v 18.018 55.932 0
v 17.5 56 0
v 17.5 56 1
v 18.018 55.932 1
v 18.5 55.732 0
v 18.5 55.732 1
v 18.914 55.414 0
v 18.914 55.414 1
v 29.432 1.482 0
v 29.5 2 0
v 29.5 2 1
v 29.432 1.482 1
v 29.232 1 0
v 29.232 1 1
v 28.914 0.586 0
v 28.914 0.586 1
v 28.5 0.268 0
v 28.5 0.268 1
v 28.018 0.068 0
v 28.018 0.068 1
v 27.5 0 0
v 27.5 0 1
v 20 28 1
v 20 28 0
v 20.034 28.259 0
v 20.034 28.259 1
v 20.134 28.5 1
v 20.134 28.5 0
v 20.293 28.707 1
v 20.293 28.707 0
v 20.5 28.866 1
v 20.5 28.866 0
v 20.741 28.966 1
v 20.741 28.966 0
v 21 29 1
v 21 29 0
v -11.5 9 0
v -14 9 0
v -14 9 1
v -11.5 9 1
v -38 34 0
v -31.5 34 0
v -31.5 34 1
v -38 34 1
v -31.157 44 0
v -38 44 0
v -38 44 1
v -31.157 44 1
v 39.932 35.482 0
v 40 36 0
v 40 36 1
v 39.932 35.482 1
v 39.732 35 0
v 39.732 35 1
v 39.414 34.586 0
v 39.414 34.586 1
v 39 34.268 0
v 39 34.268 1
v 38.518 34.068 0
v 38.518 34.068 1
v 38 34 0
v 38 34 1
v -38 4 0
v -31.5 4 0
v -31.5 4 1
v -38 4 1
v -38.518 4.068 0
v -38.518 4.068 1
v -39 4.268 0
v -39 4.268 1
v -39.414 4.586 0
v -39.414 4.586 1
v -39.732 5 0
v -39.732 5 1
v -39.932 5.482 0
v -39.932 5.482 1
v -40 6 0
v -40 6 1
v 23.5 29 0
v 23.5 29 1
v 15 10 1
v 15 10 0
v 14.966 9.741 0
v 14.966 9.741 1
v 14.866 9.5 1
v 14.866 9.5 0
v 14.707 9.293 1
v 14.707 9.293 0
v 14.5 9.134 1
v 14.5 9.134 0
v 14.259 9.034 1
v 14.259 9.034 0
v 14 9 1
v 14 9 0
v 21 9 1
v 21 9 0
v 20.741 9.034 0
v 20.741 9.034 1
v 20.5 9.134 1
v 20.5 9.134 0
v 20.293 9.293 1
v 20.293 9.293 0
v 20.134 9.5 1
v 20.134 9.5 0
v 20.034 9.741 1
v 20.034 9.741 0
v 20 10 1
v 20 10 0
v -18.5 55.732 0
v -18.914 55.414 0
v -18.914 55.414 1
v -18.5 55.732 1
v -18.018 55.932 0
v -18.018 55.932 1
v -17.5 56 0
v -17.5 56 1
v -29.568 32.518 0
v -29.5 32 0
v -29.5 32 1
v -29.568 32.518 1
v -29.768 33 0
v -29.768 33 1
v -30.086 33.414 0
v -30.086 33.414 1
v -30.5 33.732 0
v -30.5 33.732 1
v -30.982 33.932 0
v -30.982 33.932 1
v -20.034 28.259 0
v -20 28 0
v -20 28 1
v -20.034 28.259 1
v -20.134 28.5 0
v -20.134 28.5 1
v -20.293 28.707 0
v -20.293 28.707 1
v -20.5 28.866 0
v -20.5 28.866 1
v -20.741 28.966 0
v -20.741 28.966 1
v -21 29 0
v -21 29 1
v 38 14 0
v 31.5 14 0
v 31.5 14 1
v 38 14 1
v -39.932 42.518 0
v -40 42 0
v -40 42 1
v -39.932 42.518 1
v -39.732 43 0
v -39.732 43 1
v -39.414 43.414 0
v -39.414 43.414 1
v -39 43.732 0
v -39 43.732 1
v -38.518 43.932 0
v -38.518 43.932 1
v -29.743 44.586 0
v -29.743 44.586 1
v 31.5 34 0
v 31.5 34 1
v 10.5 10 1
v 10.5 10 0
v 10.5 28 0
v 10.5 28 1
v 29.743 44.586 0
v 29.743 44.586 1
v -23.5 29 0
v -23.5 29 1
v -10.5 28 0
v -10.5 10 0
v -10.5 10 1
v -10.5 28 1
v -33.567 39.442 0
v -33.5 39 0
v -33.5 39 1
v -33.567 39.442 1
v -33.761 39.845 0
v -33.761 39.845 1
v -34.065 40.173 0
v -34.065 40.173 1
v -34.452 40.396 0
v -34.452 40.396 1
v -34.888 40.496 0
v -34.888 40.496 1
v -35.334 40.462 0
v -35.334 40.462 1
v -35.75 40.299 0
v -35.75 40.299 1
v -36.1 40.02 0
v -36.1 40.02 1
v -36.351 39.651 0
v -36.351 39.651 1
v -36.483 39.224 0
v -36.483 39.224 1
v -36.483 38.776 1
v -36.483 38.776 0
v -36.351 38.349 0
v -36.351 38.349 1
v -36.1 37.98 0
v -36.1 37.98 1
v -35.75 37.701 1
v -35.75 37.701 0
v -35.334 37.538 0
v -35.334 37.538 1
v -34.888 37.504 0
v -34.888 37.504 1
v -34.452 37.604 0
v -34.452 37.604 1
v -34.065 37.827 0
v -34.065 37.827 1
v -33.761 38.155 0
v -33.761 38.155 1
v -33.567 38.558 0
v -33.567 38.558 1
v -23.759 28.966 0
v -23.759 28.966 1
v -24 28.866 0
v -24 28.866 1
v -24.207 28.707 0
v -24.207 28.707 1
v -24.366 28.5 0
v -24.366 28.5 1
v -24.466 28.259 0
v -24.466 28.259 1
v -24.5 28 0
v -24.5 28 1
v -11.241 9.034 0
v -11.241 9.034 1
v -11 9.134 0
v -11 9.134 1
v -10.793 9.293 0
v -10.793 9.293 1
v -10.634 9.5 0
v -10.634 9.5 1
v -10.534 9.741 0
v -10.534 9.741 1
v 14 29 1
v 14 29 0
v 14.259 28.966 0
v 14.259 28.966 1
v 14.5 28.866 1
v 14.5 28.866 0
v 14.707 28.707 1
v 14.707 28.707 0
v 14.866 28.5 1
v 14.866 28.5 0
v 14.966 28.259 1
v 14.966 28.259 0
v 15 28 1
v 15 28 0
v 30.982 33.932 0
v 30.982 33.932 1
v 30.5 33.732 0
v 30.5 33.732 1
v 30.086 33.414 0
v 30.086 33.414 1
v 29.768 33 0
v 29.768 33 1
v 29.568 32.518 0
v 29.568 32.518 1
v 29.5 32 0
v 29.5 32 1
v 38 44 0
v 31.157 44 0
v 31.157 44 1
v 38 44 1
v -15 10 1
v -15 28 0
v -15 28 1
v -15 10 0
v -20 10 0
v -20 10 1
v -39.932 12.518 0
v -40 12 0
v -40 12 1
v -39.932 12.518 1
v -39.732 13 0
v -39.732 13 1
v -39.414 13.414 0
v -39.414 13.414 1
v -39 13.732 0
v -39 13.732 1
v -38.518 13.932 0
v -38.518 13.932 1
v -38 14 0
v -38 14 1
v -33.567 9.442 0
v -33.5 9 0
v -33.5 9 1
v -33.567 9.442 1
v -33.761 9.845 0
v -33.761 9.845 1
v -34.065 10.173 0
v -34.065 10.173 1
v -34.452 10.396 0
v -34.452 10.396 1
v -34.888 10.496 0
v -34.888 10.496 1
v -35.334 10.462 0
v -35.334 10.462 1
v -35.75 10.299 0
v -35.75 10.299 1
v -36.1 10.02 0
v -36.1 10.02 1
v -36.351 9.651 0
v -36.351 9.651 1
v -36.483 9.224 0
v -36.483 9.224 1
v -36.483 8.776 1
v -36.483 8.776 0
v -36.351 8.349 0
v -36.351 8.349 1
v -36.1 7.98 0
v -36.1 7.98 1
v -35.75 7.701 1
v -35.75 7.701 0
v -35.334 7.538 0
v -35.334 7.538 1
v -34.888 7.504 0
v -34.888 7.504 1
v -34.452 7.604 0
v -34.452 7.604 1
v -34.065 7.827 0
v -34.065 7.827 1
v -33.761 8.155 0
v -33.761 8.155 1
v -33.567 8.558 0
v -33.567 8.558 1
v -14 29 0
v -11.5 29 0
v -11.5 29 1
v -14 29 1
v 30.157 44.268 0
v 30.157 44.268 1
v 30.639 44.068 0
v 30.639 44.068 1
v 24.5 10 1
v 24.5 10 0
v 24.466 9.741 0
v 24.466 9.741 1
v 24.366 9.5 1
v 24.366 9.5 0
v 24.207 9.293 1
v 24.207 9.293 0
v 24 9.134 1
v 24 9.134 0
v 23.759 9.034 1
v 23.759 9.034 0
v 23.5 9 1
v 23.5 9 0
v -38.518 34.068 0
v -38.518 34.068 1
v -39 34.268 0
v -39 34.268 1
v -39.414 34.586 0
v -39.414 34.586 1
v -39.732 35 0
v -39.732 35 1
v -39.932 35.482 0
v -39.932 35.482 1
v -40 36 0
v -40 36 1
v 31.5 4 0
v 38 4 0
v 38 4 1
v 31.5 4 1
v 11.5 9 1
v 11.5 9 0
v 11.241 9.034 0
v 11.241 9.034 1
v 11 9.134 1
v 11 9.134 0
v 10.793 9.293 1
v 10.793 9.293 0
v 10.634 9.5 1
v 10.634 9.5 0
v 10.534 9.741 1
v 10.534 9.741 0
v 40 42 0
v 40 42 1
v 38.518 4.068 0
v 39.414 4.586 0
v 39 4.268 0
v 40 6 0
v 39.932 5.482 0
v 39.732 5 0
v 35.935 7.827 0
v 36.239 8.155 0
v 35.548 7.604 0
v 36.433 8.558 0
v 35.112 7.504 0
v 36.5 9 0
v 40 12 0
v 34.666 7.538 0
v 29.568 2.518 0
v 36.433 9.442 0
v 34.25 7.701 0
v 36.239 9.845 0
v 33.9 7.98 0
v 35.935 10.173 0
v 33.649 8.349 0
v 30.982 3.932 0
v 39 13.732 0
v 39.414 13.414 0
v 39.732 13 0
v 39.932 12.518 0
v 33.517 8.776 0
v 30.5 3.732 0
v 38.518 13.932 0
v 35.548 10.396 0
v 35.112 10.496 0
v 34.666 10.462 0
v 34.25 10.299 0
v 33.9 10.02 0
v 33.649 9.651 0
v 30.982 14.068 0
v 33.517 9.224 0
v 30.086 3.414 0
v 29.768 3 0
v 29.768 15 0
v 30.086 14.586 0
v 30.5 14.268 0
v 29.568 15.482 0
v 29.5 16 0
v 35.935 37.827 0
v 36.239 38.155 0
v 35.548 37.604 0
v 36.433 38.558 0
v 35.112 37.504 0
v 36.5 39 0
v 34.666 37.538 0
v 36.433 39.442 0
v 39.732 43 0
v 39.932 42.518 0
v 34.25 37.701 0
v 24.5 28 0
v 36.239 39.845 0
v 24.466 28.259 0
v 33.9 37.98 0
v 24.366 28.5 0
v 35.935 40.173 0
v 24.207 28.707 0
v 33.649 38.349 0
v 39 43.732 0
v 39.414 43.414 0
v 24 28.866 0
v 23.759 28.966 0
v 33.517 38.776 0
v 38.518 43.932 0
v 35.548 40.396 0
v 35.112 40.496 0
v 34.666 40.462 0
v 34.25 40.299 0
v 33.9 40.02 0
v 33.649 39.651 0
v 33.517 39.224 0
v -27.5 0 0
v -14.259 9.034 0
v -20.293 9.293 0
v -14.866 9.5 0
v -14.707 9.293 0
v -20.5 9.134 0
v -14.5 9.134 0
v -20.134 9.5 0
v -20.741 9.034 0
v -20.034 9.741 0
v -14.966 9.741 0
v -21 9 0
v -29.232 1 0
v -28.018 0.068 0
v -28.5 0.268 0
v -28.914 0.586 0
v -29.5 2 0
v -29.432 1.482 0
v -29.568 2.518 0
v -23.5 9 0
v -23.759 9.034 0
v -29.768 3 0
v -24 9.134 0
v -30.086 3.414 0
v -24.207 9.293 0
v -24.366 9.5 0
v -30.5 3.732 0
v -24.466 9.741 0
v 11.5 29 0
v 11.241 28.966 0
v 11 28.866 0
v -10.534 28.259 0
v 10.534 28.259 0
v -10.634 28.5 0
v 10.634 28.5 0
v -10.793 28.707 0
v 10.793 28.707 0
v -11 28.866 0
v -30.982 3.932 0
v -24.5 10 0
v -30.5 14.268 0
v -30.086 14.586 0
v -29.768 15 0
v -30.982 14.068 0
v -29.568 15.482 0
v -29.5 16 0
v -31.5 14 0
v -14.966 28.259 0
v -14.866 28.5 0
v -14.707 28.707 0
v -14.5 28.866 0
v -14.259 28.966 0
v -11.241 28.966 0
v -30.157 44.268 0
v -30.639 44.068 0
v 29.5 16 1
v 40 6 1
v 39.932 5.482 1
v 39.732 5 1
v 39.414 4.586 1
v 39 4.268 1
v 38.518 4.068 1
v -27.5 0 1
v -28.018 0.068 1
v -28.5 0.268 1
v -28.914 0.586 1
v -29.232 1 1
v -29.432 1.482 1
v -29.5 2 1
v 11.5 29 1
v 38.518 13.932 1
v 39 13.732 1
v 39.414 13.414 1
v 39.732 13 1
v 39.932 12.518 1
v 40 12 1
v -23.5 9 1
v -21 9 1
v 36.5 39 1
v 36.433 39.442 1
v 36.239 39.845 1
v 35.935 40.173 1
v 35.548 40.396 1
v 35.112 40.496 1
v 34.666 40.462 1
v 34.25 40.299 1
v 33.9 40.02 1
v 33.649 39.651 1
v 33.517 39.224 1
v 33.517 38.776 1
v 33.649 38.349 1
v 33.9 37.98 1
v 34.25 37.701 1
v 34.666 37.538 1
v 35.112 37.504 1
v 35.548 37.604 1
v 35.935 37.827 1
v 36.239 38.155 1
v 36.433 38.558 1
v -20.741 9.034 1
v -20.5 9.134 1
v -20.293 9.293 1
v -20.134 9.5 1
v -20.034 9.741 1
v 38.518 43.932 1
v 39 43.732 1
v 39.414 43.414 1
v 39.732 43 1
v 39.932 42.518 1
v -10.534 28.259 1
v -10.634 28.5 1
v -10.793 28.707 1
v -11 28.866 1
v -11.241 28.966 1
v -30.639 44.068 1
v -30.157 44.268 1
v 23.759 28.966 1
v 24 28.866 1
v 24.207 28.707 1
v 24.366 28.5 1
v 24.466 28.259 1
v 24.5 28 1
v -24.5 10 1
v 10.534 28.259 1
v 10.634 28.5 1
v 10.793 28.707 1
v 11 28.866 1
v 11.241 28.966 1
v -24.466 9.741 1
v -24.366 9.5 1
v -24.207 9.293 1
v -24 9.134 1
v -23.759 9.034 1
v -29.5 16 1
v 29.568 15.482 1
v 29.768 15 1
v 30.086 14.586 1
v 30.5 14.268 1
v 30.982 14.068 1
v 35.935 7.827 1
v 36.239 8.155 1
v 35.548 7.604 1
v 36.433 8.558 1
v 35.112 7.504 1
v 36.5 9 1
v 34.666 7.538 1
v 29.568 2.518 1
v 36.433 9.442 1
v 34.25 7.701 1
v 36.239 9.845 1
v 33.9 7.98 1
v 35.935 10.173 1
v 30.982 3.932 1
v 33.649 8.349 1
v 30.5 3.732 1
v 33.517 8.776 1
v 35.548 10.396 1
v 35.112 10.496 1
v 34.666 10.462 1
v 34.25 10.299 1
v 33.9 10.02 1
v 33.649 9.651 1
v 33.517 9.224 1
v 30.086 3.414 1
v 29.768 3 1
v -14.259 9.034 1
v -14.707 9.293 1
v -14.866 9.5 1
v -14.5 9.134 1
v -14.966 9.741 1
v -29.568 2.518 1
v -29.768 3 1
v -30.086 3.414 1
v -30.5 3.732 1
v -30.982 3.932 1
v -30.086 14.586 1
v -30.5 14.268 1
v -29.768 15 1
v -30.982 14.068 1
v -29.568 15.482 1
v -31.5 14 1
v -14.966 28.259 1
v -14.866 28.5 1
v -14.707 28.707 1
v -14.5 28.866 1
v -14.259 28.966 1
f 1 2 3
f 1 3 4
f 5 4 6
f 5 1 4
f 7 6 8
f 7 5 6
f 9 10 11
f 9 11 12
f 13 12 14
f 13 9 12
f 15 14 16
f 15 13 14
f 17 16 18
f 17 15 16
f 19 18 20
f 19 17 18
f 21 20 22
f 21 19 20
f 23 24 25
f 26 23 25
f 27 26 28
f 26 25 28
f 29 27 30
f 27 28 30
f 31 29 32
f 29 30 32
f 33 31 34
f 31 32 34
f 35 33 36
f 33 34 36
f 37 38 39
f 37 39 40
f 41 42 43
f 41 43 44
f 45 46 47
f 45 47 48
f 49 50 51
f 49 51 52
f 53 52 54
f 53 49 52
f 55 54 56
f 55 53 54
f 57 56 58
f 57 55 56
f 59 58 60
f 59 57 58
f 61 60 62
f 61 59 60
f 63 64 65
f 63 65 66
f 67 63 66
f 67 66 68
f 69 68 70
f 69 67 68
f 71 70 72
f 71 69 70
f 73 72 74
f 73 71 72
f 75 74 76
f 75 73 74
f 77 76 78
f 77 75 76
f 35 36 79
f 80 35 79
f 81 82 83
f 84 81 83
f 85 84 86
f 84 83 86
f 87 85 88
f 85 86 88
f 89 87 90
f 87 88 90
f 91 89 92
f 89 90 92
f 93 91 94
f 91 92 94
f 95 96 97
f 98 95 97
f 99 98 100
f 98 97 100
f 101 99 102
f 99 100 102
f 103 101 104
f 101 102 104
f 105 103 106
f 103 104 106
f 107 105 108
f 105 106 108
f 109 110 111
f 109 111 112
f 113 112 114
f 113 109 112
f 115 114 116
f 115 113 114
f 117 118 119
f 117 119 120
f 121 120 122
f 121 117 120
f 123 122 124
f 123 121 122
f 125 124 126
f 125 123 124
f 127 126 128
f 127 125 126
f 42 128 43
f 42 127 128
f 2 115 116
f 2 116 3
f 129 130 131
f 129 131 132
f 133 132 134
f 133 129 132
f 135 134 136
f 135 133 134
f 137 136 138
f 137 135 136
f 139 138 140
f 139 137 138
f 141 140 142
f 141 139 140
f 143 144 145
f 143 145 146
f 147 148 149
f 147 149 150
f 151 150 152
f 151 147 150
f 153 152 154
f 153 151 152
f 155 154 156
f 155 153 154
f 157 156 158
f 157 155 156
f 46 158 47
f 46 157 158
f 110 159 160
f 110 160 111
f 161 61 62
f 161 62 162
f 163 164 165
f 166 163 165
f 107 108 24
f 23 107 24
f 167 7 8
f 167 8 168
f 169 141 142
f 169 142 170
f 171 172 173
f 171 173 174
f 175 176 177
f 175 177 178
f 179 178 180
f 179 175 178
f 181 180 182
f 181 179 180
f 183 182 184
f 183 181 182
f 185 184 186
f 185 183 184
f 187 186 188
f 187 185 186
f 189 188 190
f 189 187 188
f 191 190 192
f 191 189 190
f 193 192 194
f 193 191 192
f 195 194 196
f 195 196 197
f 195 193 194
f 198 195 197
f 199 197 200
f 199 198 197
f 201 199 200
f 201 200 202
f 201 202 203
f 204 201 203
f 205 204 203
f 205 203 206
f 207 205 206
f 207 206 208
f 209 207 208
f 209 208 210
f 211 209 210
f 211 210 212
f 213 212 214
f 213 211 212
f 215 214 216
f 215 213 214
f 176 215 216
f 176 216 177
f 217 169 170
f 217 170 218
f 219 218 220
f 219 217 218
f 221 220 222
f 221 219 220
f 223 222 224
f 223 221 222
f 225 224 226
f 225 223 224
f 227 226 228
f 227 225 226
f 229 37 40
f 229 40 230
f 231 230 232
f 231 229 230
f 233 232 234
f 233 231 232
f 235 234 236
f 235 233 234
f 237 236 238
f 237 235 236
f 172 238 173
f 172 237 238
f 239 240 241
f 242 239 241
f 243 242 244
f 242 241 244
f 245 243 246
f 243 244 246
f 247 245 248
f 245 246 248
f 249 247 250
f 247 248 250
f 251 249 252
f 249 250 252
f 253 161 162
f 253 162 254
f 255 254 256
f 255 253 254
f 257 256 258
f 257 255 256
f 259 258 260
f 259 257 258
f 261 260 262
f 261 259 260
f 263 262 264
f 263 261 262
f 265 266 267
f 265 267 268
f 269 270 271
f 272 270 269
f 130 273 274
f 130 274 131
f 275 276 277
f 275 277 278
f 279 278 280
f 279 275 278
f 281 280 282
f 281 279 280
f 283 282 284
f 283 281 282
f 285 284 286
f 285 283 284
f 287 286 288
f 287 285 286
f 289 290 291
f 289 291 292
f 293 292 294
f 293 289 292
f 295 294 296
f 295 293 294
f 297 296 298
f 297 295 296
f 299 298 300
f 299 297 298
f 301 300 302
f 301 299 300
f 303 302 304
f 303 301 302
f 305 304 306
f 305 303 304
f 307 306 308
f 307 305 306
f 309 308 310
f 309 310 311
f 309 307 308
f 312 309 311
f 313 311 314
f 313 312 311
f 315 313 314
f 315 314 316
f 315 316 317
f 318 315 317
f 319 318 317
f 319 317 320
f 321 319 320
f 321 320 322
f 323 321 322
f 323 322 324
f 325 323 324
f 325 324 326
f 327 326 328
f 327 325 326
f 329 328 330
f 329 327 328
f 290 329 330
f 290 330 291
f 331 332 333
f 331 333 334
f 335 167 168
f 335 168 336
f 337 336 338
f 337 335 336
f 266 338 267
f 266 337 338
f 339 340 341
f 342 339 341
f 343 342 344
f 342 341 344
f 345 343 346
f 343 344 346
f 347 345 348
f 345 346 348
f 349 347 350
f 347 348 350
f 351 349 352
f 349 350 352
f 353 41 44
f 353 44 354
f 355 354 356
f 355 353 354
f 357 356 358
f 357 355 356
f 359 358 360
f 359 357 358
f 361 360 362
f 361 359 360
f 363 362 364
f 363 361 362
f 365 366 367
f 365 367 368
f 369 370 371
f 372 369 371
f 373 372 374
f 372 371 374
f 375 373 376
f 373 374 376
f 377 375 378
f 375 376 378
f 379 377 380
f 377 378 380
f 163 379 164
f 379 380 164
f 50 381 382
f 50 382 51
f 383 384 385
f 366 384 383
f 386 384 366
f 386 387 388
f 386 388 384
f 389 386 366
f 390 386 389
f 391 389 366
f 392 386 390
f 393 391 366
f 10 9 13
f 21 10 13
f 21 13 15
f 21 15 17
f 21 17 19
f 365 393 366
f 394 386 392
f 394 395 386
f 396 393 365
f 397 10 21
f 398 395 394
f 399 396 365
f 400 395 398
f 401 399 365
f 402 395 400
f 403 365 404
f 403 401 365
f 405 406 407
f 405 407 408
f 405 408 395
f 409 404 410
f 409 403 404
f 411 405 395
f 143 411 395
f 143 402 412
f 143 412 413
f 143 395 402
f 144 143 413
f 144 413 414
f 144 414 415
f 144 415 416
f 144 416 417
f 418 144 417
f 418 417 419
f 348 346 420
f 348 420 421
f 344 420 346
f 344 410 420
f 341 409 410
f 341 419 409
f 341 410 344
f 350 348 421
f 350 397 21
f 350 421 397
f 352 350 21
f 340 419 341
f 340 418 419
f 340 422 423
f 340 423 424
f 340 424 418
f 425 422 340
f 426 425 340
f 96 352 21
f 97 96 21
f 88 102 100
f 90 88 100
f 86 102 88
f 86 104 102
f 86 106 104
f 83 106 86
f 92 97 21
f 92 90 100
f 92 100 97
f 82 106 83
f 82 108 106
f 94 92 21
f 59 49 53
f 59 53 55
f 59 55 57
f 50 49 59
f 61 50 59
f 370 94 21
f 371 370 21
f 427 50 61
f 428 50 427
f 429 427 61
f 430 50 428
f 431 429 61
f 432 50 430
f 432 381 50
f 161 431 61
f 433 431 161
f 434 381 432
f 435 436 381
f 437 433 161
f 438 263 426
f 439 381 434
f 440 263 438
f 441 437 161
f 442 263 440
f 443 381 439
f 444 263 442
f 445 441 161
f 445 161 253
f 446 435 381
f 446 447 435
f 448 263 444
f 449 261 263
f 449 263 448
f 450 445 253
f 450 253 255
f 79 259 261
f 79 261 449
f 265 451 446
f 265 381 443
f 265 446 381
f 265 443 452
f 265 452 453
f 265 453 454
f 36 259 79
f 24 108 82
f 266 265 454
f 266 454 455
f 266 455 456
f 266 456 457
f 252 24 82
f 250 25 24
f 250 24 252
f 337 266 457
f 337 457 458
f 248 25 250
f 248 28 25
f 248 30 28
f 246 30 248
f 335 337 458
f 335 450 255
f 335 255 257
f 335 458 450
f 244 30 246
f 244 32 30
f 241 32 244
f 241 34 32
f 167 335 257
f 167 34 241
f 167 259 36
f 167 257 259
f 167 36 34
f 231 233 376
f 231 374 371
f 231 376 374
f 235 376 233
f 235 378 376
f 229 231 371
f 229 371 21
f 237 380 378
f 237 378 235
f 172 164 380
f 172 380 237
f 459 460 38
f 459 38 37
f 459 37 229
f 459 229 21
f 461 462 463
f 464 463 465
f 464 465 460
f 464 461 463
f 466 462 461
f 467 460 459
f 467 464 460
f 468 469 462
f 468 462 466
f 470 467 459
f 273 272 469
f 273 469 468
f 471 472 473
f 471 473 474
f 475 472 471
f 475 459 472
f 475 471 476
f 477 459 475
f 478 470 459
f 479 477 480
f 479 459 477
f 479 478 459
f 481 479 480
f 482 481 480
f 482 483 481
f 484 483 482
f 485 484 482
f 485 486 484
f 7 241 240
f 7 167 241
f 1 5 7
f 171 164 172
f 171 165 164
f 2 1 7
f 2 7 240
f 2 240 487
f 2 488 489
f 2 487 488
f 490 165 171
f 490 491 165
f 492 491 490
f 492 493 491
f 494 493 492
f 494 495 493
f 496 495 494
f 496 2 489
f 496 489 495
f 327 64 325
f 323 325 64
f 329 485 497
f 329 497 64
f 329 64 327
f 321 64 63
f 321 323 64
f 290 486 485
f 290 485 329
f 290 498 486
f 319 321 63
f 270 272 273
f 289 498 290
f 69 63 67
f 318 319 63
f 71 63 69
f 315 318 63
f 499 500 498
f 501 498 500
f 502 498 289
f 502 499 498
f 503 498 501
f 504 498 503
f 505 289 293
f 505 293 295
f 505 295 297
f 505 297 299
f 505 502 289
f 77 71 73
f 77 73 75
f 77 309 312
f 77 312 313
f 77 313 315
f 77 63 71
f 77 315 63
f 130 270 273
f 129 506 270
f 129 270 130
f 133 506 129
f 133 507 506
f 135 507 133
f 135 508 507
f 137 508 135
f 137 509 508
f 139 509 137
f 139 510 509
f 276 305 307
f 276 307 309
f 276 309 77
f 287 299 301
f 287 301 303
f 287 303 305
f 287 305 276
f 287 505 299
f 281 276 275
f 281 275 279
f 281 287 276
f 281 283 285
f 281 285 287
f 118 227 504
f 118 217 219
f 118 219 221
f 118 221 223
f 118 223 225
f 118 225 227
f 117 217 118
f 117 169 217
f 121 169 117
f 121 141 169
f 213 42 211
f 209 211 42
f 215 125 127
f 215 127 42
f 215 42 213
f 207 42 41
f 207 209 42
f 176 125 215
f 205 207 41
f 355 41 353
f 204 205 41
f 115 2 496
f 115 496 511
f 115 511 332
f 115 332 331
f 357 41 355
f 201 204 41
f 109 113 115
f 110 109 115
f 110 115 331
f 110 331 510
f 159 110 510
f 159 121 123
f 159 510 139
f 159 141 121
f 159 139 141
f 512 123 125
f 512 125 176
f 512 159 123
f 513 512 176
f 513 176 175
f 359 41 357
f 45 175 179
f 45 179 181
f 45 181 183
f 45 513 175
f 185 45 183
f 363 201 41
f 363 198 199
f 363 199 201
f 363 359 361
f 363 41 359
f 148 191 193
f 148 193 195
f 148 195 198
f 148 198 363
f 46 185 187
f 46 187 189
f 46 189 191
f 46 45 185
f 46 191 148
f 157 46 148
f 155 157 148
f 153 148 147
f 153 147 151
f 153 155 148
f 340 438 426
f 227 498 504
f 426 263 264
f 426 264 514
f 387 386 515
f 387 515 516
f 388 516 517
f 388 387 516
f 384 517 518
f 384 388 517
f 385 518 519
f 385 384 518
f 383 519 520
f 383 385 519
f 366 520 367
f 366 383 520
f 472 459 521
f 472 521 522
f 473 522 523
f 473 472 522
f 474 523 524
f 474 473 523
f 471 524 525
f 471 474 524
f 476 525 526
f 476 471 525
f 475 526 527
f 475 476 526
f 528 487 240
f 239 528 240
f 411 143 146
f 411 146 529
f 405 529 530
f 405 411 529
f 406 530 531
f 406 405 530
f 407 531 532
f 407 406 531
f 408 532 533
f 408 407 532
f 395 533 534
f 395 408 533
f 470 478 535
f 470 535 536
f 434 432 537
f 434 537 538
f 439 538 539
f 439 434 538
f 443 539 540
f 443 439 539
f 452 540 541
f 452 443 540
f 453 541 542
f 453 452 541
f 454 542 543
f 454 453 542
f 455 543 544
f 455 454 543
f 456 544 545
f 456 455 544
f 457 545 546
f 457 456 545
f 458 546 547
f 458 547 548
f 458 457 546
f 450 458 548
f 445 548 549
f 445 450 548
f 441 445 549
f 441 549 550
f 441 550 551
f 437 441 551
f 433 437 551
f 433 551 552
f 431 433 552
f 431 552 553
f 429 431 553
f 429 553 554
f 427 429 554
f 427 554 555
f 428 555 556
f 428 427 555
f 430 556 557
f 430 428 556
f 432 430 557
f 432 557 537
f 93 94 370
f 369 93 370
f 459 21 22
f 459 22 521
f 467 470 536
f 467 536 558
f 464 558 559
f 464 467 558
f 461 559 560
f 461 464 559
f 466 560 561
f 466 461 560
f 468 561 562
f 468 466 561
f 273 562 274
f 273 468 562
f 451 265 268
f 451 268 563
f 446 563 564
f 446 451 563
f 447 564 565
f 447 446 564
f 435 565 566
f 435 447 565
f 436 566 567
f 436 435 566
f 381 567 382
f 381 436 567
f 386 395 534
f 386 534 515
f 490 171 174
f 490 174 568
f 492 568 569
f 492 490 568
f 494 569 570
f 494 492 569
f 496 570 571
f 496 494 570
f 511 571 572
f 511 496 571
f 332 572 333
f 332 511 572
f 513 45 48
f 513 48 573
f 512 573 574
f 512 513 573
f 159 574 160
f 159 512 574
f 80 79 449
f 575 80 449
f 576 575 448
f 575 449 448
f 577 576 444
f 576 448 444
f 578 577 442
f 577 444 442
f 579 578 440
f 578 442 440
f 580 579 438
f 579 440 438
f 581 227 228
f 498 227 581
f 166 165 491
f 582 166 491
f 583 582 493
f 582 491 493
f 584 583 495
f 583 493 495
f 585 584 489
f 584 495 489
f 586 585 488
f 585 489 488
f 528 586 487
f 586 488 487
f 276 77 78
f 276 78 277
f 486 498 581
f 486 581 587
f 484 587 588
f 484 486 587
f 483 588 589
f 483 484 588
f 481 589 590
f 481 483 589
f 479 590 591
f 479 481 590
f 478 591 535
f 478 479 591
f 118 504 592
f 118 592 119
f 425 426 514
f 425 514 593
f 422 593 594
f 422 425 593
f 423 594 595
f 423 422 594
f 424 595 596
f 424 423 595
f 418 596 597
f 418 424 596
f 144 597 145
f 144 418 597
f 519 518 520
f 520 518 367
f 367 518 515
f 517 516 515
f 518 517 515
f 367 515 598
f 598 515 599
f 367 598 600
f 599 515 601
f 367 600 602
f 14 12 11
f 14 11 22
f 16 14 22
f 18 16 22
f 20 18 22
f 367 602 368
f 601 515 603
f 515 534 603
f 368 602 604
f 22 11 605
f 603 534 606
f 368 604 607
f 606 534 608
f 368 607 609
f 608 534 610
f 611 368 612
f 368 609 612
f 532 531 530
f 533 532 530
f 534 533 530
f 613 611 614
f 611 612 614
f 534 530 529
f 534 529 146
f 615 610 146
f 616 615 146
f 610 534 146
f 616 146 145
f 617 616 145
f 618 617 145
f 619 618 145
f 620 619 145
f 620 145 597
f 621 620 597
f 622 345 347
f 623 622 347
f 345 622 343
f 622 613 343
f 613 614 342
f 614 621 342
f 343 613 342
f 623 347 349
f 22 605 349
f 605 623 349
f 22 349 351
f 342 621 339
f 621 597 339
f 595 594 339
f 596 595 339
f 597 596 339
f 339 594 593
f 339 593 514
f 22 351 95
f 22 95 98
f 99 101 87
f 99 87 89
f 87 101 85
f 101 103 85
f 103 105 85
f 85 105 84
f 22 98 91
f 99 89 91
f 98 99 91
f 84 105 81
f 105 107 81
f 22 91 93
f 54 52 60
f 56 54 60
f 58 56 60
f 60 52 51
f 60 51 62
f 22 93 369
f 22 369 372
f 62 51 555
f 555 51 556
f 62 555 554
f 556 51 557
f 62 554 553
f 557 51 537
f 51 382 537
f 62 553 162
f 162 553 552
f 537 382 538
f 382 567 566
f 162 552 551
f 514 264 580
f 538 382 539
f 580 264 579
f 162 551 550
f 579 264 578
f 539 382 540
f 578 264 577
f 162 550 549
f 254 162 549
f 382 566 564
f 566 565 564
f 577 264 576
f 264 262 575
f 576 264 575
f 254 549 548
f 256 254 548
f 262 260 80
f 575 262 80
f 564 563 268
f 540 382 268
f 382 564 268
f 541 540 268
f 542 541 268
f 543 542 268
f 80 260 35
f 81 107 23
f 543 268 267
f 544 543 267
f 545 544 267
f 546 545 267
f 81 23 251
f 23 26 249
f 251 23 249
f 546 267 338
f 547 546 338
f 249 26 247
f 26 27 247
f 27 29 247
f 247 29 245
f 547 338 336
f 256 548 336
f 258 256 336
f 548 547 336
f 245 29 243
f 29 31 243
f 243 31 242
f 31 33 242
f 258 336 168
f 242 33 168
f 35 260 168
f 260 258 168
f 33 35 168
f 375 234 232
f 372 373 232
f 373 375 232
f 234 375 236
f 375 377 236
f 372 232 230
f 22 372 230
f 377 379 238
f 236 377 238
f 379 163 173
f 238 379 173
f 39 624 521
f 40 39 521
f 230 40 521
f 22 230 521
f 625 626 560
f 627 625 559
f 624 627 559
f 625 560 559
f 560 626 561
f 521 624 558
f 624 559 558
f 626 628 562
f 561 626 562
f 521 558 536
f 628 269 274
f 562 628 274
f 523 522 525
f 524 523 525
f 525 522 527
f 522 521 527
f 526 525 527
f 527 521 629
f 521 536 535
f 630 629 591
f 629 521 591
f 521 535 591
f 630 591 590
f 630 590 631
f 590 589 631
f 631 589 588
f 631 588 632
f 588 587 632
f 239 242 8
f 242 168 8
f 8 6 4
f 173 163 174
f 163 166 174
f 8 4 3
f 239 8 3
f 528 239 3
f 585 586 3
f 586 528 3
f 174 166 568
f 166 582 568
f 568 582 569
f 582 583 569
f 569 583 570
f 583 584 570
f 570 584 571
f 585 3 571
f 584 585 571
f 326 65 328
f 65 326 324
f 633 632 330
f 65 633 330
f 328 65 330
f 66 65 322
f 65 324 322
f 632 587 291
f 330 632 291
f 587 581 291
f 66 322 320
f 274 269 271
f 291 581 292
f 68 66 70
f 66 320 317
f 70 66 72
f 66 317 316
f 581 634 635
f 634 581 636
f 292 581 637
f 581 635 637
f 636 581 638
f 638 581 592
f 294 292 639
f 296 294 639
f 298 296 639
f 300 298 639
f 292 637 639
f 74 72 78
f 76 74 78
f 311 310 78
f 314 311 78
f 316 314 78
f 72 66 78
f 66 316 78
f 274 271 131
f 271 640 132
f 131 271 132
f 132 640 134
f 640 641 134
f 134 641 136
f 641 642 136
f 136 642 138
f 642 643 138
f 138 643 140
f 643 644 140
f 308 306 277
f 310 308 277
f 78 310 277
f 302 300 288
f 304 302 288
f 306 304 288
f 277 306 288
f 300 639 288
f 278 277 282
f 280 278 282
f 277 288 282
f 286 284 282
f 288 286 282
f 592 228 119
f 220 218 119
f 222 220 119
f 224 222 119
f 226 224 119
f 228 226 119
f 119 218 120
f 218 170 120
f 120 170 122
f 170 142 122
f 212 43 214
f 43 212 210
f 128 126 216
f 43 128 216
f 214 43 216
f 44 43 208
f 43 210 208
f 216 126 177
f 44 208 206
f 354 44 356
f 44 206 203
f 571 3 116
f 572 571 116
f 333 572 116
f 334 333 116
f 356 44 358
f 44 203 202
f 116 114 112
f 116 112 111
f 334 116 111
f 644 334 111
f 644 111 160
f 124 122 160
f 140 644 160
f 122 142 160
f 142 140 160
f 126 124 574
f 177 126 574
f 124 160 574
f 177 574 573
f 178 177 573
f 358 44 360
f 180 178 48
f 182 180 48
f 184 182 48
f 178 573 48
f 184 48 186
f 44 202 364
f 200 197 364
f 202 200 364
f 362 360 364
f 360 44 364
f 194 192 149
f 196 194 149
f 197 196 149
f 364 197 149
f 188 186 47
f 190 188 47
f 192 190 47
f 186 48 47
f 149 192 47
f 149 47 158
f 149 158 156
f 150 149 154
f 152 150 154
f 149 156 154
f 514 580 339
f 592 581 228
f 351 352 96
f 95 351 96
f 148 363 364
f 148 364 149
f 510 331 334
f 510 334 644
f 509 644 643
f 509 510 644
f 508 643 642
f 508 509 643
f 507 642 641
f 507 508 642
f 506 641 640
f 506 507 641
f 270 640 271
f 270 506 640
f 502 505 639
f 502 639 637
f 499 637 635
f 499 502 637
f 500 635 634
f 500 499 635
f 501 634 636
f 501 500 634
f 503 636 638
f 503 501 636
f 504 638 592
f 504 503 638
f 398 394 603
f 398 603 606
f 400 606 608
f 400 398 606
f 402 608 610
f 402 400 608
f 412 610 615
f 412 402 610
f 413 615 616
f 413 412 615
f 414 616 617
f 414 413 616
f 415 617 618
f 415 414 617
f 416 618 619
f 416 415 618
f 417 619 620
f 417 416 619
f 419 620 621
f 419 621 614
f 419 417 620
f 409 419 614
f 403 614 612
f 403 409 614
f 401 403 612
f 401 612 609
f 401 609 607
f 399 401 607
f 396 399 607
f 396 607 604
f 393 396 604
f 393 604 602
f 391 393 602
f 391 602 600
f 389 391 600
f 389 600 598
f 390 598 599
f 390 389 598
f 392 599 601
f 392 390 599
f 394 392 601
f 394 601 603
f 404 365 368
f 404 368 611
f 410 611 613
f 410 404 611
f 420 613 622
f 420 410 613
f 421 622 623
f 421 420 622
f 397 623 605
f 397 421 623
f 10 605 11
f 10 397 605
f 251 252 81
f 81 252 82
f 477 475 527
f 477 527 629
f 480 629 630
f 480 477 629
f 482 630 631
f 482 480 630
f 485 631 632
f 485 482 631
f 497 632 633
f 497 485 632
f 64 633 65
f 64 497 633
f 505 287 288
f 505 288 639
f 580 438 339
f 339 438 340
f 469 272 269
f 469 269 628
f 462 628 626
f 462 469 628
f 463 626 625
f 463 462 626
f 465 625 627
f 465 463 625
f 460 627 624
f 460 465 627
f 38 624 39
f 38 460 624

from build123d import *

# Parameters (mm, degrees)
MODEL_R         = 1.5
EXTRUDE_1_DEPTH = 1


with BuildPart() as part:
    # Model → Бобышка-Вытянуть1 (new body)
    with BuildSketch(Plane.XY):
        with BuildLine():
            Line((-29.5, 16), (-29.5, 32))
            ThreePointArc((-29.5, 32), (-30.085786438, 33.414213562), (-31.5, 34))
            Line((-31.5, 34), (-38, 34))
            ThreePointArc((-38, 34), (-39.414213562, 34.585786438), (-40, 36))
            Line((-40, 36), (-40, 42))
            ThreePointArc((-40, 42), (-39.414213562, 43.414213562), (-38, 44))
            Line((-38, 44), (-31.156854249, 44))
            ThreePointArc((-31.156854249, 44), (-30.391487385, 44.152240935), (-29.742640687, 44.585786438))
            Line((-29.742640687, 44.585786438), (-18.914213562, 55.414213562))
            ThreePointArc((-18.914213562, 55.414213562), (-18.265366865, 55.847759065), (-17.5, 56))
            Line((-17.5, 56), (0, 56))
            Line((0, 56), (17.5, 56))
            ThreePointArc((17.5, 56), (18.265366865, 55.847759065), (18.914213562, 55.414213562))
            Line((18.914213562, 55.414213562), (29.742640687, 44.585786438))
            ThreePointArc((29.742640687, 44.585786438), (30.391487385, 44.152240935), (31.156854249, 44))
            Line((31.156854249, 44), (38, 44))
            ThreePointArc((38, 44), (39.414213562, 43.414213562), (40, 42))
            Line((40, 42), (40, 36))
            ThreePointArc((40, 36), (39.414213562, 34.585786438), (38, 34))
            Line((38, 34), (31.5, 34))
            ThreePointArc((31.5, 34), (30.085786438, 33.414213562), (29.5, 32))
            Line((29.5, 32), (29.5, 16))
            ThreePointArc((29.5, 16), (30.085786438, 14.585786438), (31.5, 14))
            Line((31.5, 14), (38, 14))
            ThreePointArc((38, 14), (39.414213562, 13.414213562), (40, 12))
            Line((40, 12), (40, 6))
            ThreePointArc((40, 6), (39.414213562, 4.585786438), (38, 4))
            Line((38, 4), (31.5, 4))
            ThreePointArc((31.5, 4), (30.085786438, 3.414213562), (29.5, 2))
            ThreePointArc((29.5, 2), (28.914213562, 0.585786438), (27.5, 0))
            Line((27.5, 0), (0, 0))
            Line((0, 0), (-27.5, 0))
            ThreePointArc((-27.5, 0), (-28.914213562, 0.585786438), (-29.5, 2))
            ThreePointArc((-29.5, 2), (-30.085786438, 3.414213562), (-31.5, 4))
            Line((-31.5, 4), (-38, 4))
            ThreePointArc((-38, 4), (-39.414213562, 4.585786438), (-40, 6))
            Line((-40, 6), (-40, 12))
            ThreePointArc((-40, 12), (-39.414213562, 13.414213562), (-38, 14))
            Line((-38, 14), (-31.5, 14))
            ThreePointArc((-31.5, 14), (-30.085786438, 14.585786438), (-29.5, 16))
        make_face()
        with Locations((-35, 9)):
            Circle(MODEL_R, mode=Mode.SUBTRACT)
        with Locations((-35, 39)):
            Circle(MODEL_R, mode=Mode.SUBTRACT)
        with Locations((35, 9)):
            Circle(MODEL_R, mode=Mode.SUBTRACT)
        with Locations((35, 39)):
            Circle(MODEL_R, mode=Mode.SUBTRACT)
        with BuildLine():
            Line((-23.5, 9), (-21, 9))
            ThreePointArc((-21, 9), (-20.292893219, 9.292893219), (-20, 10))
            Line((-20, 10), (-20, 28))
            ThreePointArc((-20, 28), (-20.292893219, 28.707106781), (-21, 29))
            Line((-21, 29), (-23.5, 29))
            ThreePointArc((-23.5, 29), (-24.207106781, 28.707106781), (-24.5, 28))
            Line((-24.5, 28), (-24.5, 10))
            ThreePointArc((-24.5, 10), (-24.207106781, 9.292893219), (-23.5, 9))
        make_face(mode=Mode.SUBTRACT)
        with BuildLine():
            Line((-14, 9), (-11.5, 9))
            ThreePointArc((-11.5, 9), (-10.792893219, 9.292893219), (-10.5, 10))
            Line((-10.5, 10), (-10.5, 28))
            ThreePointArc((-10.5, 28), (-10.792893219, 28.707106781), (-11.5, 29))
            Line((-11.5, 29), (-14, 29))
            ThreePointArc((-14, 29), (-14.707106781, 28.707106781), (-15, 28))
            Line((-15, 28), (-15, 10))
            ThreePointArc((-15, 10), (-14.707106781, 9.292893219), (-14, 9))
        make_face(mode=Mode.SUBTRACT)
        with BuildLine():
            Line((23.5, 9), (21, 9))
            ThreePointArc((21, 9), (20.292893219, 9.292893219), (20, 10))
            Line((20, 10), (20, 28))
            ThreePointArc((20, 28), (20.292893219, 28.707106781), (21, 29))
            Line((21, 29), (23.5, 29))
            ThreePointArc((23.5, 29), (24.207106781, 28.707106781), (24.5, 28))
            Line((24.5, 28), (24.5, 10))
            ThreePointArc((24.5, 10), (24.207106781, 9.292893219), (23.5, 9))
        make_face(mode=Mode.SUBTRACT)
        with BuildLine():
            Line((14, 9), (11.5, 9))
            ThreePointArc((11.5, 9), (10.792893219, 9.292893219), (10.5, 10))
            Line((10.5, 10), (10.5, 28))
            ThreePointArc((10.5, 28), (10.792893219, 28.707106781), (11.5, 29))
            Line((11.5, 29), (14, 29))
            ThreePointArc((14, 29), (14.707106781, 28.707106781), (15, 28))
            Line((15, 28), (15, 10))
            ThreePointArc((15, 10), (14.707106781, 9.292893219), (14, 9))
        make_face(mode=Mode.SUBTRACT)
    extrude(amount=EXTRUDE_1_DEPTH)


solid = part.part
